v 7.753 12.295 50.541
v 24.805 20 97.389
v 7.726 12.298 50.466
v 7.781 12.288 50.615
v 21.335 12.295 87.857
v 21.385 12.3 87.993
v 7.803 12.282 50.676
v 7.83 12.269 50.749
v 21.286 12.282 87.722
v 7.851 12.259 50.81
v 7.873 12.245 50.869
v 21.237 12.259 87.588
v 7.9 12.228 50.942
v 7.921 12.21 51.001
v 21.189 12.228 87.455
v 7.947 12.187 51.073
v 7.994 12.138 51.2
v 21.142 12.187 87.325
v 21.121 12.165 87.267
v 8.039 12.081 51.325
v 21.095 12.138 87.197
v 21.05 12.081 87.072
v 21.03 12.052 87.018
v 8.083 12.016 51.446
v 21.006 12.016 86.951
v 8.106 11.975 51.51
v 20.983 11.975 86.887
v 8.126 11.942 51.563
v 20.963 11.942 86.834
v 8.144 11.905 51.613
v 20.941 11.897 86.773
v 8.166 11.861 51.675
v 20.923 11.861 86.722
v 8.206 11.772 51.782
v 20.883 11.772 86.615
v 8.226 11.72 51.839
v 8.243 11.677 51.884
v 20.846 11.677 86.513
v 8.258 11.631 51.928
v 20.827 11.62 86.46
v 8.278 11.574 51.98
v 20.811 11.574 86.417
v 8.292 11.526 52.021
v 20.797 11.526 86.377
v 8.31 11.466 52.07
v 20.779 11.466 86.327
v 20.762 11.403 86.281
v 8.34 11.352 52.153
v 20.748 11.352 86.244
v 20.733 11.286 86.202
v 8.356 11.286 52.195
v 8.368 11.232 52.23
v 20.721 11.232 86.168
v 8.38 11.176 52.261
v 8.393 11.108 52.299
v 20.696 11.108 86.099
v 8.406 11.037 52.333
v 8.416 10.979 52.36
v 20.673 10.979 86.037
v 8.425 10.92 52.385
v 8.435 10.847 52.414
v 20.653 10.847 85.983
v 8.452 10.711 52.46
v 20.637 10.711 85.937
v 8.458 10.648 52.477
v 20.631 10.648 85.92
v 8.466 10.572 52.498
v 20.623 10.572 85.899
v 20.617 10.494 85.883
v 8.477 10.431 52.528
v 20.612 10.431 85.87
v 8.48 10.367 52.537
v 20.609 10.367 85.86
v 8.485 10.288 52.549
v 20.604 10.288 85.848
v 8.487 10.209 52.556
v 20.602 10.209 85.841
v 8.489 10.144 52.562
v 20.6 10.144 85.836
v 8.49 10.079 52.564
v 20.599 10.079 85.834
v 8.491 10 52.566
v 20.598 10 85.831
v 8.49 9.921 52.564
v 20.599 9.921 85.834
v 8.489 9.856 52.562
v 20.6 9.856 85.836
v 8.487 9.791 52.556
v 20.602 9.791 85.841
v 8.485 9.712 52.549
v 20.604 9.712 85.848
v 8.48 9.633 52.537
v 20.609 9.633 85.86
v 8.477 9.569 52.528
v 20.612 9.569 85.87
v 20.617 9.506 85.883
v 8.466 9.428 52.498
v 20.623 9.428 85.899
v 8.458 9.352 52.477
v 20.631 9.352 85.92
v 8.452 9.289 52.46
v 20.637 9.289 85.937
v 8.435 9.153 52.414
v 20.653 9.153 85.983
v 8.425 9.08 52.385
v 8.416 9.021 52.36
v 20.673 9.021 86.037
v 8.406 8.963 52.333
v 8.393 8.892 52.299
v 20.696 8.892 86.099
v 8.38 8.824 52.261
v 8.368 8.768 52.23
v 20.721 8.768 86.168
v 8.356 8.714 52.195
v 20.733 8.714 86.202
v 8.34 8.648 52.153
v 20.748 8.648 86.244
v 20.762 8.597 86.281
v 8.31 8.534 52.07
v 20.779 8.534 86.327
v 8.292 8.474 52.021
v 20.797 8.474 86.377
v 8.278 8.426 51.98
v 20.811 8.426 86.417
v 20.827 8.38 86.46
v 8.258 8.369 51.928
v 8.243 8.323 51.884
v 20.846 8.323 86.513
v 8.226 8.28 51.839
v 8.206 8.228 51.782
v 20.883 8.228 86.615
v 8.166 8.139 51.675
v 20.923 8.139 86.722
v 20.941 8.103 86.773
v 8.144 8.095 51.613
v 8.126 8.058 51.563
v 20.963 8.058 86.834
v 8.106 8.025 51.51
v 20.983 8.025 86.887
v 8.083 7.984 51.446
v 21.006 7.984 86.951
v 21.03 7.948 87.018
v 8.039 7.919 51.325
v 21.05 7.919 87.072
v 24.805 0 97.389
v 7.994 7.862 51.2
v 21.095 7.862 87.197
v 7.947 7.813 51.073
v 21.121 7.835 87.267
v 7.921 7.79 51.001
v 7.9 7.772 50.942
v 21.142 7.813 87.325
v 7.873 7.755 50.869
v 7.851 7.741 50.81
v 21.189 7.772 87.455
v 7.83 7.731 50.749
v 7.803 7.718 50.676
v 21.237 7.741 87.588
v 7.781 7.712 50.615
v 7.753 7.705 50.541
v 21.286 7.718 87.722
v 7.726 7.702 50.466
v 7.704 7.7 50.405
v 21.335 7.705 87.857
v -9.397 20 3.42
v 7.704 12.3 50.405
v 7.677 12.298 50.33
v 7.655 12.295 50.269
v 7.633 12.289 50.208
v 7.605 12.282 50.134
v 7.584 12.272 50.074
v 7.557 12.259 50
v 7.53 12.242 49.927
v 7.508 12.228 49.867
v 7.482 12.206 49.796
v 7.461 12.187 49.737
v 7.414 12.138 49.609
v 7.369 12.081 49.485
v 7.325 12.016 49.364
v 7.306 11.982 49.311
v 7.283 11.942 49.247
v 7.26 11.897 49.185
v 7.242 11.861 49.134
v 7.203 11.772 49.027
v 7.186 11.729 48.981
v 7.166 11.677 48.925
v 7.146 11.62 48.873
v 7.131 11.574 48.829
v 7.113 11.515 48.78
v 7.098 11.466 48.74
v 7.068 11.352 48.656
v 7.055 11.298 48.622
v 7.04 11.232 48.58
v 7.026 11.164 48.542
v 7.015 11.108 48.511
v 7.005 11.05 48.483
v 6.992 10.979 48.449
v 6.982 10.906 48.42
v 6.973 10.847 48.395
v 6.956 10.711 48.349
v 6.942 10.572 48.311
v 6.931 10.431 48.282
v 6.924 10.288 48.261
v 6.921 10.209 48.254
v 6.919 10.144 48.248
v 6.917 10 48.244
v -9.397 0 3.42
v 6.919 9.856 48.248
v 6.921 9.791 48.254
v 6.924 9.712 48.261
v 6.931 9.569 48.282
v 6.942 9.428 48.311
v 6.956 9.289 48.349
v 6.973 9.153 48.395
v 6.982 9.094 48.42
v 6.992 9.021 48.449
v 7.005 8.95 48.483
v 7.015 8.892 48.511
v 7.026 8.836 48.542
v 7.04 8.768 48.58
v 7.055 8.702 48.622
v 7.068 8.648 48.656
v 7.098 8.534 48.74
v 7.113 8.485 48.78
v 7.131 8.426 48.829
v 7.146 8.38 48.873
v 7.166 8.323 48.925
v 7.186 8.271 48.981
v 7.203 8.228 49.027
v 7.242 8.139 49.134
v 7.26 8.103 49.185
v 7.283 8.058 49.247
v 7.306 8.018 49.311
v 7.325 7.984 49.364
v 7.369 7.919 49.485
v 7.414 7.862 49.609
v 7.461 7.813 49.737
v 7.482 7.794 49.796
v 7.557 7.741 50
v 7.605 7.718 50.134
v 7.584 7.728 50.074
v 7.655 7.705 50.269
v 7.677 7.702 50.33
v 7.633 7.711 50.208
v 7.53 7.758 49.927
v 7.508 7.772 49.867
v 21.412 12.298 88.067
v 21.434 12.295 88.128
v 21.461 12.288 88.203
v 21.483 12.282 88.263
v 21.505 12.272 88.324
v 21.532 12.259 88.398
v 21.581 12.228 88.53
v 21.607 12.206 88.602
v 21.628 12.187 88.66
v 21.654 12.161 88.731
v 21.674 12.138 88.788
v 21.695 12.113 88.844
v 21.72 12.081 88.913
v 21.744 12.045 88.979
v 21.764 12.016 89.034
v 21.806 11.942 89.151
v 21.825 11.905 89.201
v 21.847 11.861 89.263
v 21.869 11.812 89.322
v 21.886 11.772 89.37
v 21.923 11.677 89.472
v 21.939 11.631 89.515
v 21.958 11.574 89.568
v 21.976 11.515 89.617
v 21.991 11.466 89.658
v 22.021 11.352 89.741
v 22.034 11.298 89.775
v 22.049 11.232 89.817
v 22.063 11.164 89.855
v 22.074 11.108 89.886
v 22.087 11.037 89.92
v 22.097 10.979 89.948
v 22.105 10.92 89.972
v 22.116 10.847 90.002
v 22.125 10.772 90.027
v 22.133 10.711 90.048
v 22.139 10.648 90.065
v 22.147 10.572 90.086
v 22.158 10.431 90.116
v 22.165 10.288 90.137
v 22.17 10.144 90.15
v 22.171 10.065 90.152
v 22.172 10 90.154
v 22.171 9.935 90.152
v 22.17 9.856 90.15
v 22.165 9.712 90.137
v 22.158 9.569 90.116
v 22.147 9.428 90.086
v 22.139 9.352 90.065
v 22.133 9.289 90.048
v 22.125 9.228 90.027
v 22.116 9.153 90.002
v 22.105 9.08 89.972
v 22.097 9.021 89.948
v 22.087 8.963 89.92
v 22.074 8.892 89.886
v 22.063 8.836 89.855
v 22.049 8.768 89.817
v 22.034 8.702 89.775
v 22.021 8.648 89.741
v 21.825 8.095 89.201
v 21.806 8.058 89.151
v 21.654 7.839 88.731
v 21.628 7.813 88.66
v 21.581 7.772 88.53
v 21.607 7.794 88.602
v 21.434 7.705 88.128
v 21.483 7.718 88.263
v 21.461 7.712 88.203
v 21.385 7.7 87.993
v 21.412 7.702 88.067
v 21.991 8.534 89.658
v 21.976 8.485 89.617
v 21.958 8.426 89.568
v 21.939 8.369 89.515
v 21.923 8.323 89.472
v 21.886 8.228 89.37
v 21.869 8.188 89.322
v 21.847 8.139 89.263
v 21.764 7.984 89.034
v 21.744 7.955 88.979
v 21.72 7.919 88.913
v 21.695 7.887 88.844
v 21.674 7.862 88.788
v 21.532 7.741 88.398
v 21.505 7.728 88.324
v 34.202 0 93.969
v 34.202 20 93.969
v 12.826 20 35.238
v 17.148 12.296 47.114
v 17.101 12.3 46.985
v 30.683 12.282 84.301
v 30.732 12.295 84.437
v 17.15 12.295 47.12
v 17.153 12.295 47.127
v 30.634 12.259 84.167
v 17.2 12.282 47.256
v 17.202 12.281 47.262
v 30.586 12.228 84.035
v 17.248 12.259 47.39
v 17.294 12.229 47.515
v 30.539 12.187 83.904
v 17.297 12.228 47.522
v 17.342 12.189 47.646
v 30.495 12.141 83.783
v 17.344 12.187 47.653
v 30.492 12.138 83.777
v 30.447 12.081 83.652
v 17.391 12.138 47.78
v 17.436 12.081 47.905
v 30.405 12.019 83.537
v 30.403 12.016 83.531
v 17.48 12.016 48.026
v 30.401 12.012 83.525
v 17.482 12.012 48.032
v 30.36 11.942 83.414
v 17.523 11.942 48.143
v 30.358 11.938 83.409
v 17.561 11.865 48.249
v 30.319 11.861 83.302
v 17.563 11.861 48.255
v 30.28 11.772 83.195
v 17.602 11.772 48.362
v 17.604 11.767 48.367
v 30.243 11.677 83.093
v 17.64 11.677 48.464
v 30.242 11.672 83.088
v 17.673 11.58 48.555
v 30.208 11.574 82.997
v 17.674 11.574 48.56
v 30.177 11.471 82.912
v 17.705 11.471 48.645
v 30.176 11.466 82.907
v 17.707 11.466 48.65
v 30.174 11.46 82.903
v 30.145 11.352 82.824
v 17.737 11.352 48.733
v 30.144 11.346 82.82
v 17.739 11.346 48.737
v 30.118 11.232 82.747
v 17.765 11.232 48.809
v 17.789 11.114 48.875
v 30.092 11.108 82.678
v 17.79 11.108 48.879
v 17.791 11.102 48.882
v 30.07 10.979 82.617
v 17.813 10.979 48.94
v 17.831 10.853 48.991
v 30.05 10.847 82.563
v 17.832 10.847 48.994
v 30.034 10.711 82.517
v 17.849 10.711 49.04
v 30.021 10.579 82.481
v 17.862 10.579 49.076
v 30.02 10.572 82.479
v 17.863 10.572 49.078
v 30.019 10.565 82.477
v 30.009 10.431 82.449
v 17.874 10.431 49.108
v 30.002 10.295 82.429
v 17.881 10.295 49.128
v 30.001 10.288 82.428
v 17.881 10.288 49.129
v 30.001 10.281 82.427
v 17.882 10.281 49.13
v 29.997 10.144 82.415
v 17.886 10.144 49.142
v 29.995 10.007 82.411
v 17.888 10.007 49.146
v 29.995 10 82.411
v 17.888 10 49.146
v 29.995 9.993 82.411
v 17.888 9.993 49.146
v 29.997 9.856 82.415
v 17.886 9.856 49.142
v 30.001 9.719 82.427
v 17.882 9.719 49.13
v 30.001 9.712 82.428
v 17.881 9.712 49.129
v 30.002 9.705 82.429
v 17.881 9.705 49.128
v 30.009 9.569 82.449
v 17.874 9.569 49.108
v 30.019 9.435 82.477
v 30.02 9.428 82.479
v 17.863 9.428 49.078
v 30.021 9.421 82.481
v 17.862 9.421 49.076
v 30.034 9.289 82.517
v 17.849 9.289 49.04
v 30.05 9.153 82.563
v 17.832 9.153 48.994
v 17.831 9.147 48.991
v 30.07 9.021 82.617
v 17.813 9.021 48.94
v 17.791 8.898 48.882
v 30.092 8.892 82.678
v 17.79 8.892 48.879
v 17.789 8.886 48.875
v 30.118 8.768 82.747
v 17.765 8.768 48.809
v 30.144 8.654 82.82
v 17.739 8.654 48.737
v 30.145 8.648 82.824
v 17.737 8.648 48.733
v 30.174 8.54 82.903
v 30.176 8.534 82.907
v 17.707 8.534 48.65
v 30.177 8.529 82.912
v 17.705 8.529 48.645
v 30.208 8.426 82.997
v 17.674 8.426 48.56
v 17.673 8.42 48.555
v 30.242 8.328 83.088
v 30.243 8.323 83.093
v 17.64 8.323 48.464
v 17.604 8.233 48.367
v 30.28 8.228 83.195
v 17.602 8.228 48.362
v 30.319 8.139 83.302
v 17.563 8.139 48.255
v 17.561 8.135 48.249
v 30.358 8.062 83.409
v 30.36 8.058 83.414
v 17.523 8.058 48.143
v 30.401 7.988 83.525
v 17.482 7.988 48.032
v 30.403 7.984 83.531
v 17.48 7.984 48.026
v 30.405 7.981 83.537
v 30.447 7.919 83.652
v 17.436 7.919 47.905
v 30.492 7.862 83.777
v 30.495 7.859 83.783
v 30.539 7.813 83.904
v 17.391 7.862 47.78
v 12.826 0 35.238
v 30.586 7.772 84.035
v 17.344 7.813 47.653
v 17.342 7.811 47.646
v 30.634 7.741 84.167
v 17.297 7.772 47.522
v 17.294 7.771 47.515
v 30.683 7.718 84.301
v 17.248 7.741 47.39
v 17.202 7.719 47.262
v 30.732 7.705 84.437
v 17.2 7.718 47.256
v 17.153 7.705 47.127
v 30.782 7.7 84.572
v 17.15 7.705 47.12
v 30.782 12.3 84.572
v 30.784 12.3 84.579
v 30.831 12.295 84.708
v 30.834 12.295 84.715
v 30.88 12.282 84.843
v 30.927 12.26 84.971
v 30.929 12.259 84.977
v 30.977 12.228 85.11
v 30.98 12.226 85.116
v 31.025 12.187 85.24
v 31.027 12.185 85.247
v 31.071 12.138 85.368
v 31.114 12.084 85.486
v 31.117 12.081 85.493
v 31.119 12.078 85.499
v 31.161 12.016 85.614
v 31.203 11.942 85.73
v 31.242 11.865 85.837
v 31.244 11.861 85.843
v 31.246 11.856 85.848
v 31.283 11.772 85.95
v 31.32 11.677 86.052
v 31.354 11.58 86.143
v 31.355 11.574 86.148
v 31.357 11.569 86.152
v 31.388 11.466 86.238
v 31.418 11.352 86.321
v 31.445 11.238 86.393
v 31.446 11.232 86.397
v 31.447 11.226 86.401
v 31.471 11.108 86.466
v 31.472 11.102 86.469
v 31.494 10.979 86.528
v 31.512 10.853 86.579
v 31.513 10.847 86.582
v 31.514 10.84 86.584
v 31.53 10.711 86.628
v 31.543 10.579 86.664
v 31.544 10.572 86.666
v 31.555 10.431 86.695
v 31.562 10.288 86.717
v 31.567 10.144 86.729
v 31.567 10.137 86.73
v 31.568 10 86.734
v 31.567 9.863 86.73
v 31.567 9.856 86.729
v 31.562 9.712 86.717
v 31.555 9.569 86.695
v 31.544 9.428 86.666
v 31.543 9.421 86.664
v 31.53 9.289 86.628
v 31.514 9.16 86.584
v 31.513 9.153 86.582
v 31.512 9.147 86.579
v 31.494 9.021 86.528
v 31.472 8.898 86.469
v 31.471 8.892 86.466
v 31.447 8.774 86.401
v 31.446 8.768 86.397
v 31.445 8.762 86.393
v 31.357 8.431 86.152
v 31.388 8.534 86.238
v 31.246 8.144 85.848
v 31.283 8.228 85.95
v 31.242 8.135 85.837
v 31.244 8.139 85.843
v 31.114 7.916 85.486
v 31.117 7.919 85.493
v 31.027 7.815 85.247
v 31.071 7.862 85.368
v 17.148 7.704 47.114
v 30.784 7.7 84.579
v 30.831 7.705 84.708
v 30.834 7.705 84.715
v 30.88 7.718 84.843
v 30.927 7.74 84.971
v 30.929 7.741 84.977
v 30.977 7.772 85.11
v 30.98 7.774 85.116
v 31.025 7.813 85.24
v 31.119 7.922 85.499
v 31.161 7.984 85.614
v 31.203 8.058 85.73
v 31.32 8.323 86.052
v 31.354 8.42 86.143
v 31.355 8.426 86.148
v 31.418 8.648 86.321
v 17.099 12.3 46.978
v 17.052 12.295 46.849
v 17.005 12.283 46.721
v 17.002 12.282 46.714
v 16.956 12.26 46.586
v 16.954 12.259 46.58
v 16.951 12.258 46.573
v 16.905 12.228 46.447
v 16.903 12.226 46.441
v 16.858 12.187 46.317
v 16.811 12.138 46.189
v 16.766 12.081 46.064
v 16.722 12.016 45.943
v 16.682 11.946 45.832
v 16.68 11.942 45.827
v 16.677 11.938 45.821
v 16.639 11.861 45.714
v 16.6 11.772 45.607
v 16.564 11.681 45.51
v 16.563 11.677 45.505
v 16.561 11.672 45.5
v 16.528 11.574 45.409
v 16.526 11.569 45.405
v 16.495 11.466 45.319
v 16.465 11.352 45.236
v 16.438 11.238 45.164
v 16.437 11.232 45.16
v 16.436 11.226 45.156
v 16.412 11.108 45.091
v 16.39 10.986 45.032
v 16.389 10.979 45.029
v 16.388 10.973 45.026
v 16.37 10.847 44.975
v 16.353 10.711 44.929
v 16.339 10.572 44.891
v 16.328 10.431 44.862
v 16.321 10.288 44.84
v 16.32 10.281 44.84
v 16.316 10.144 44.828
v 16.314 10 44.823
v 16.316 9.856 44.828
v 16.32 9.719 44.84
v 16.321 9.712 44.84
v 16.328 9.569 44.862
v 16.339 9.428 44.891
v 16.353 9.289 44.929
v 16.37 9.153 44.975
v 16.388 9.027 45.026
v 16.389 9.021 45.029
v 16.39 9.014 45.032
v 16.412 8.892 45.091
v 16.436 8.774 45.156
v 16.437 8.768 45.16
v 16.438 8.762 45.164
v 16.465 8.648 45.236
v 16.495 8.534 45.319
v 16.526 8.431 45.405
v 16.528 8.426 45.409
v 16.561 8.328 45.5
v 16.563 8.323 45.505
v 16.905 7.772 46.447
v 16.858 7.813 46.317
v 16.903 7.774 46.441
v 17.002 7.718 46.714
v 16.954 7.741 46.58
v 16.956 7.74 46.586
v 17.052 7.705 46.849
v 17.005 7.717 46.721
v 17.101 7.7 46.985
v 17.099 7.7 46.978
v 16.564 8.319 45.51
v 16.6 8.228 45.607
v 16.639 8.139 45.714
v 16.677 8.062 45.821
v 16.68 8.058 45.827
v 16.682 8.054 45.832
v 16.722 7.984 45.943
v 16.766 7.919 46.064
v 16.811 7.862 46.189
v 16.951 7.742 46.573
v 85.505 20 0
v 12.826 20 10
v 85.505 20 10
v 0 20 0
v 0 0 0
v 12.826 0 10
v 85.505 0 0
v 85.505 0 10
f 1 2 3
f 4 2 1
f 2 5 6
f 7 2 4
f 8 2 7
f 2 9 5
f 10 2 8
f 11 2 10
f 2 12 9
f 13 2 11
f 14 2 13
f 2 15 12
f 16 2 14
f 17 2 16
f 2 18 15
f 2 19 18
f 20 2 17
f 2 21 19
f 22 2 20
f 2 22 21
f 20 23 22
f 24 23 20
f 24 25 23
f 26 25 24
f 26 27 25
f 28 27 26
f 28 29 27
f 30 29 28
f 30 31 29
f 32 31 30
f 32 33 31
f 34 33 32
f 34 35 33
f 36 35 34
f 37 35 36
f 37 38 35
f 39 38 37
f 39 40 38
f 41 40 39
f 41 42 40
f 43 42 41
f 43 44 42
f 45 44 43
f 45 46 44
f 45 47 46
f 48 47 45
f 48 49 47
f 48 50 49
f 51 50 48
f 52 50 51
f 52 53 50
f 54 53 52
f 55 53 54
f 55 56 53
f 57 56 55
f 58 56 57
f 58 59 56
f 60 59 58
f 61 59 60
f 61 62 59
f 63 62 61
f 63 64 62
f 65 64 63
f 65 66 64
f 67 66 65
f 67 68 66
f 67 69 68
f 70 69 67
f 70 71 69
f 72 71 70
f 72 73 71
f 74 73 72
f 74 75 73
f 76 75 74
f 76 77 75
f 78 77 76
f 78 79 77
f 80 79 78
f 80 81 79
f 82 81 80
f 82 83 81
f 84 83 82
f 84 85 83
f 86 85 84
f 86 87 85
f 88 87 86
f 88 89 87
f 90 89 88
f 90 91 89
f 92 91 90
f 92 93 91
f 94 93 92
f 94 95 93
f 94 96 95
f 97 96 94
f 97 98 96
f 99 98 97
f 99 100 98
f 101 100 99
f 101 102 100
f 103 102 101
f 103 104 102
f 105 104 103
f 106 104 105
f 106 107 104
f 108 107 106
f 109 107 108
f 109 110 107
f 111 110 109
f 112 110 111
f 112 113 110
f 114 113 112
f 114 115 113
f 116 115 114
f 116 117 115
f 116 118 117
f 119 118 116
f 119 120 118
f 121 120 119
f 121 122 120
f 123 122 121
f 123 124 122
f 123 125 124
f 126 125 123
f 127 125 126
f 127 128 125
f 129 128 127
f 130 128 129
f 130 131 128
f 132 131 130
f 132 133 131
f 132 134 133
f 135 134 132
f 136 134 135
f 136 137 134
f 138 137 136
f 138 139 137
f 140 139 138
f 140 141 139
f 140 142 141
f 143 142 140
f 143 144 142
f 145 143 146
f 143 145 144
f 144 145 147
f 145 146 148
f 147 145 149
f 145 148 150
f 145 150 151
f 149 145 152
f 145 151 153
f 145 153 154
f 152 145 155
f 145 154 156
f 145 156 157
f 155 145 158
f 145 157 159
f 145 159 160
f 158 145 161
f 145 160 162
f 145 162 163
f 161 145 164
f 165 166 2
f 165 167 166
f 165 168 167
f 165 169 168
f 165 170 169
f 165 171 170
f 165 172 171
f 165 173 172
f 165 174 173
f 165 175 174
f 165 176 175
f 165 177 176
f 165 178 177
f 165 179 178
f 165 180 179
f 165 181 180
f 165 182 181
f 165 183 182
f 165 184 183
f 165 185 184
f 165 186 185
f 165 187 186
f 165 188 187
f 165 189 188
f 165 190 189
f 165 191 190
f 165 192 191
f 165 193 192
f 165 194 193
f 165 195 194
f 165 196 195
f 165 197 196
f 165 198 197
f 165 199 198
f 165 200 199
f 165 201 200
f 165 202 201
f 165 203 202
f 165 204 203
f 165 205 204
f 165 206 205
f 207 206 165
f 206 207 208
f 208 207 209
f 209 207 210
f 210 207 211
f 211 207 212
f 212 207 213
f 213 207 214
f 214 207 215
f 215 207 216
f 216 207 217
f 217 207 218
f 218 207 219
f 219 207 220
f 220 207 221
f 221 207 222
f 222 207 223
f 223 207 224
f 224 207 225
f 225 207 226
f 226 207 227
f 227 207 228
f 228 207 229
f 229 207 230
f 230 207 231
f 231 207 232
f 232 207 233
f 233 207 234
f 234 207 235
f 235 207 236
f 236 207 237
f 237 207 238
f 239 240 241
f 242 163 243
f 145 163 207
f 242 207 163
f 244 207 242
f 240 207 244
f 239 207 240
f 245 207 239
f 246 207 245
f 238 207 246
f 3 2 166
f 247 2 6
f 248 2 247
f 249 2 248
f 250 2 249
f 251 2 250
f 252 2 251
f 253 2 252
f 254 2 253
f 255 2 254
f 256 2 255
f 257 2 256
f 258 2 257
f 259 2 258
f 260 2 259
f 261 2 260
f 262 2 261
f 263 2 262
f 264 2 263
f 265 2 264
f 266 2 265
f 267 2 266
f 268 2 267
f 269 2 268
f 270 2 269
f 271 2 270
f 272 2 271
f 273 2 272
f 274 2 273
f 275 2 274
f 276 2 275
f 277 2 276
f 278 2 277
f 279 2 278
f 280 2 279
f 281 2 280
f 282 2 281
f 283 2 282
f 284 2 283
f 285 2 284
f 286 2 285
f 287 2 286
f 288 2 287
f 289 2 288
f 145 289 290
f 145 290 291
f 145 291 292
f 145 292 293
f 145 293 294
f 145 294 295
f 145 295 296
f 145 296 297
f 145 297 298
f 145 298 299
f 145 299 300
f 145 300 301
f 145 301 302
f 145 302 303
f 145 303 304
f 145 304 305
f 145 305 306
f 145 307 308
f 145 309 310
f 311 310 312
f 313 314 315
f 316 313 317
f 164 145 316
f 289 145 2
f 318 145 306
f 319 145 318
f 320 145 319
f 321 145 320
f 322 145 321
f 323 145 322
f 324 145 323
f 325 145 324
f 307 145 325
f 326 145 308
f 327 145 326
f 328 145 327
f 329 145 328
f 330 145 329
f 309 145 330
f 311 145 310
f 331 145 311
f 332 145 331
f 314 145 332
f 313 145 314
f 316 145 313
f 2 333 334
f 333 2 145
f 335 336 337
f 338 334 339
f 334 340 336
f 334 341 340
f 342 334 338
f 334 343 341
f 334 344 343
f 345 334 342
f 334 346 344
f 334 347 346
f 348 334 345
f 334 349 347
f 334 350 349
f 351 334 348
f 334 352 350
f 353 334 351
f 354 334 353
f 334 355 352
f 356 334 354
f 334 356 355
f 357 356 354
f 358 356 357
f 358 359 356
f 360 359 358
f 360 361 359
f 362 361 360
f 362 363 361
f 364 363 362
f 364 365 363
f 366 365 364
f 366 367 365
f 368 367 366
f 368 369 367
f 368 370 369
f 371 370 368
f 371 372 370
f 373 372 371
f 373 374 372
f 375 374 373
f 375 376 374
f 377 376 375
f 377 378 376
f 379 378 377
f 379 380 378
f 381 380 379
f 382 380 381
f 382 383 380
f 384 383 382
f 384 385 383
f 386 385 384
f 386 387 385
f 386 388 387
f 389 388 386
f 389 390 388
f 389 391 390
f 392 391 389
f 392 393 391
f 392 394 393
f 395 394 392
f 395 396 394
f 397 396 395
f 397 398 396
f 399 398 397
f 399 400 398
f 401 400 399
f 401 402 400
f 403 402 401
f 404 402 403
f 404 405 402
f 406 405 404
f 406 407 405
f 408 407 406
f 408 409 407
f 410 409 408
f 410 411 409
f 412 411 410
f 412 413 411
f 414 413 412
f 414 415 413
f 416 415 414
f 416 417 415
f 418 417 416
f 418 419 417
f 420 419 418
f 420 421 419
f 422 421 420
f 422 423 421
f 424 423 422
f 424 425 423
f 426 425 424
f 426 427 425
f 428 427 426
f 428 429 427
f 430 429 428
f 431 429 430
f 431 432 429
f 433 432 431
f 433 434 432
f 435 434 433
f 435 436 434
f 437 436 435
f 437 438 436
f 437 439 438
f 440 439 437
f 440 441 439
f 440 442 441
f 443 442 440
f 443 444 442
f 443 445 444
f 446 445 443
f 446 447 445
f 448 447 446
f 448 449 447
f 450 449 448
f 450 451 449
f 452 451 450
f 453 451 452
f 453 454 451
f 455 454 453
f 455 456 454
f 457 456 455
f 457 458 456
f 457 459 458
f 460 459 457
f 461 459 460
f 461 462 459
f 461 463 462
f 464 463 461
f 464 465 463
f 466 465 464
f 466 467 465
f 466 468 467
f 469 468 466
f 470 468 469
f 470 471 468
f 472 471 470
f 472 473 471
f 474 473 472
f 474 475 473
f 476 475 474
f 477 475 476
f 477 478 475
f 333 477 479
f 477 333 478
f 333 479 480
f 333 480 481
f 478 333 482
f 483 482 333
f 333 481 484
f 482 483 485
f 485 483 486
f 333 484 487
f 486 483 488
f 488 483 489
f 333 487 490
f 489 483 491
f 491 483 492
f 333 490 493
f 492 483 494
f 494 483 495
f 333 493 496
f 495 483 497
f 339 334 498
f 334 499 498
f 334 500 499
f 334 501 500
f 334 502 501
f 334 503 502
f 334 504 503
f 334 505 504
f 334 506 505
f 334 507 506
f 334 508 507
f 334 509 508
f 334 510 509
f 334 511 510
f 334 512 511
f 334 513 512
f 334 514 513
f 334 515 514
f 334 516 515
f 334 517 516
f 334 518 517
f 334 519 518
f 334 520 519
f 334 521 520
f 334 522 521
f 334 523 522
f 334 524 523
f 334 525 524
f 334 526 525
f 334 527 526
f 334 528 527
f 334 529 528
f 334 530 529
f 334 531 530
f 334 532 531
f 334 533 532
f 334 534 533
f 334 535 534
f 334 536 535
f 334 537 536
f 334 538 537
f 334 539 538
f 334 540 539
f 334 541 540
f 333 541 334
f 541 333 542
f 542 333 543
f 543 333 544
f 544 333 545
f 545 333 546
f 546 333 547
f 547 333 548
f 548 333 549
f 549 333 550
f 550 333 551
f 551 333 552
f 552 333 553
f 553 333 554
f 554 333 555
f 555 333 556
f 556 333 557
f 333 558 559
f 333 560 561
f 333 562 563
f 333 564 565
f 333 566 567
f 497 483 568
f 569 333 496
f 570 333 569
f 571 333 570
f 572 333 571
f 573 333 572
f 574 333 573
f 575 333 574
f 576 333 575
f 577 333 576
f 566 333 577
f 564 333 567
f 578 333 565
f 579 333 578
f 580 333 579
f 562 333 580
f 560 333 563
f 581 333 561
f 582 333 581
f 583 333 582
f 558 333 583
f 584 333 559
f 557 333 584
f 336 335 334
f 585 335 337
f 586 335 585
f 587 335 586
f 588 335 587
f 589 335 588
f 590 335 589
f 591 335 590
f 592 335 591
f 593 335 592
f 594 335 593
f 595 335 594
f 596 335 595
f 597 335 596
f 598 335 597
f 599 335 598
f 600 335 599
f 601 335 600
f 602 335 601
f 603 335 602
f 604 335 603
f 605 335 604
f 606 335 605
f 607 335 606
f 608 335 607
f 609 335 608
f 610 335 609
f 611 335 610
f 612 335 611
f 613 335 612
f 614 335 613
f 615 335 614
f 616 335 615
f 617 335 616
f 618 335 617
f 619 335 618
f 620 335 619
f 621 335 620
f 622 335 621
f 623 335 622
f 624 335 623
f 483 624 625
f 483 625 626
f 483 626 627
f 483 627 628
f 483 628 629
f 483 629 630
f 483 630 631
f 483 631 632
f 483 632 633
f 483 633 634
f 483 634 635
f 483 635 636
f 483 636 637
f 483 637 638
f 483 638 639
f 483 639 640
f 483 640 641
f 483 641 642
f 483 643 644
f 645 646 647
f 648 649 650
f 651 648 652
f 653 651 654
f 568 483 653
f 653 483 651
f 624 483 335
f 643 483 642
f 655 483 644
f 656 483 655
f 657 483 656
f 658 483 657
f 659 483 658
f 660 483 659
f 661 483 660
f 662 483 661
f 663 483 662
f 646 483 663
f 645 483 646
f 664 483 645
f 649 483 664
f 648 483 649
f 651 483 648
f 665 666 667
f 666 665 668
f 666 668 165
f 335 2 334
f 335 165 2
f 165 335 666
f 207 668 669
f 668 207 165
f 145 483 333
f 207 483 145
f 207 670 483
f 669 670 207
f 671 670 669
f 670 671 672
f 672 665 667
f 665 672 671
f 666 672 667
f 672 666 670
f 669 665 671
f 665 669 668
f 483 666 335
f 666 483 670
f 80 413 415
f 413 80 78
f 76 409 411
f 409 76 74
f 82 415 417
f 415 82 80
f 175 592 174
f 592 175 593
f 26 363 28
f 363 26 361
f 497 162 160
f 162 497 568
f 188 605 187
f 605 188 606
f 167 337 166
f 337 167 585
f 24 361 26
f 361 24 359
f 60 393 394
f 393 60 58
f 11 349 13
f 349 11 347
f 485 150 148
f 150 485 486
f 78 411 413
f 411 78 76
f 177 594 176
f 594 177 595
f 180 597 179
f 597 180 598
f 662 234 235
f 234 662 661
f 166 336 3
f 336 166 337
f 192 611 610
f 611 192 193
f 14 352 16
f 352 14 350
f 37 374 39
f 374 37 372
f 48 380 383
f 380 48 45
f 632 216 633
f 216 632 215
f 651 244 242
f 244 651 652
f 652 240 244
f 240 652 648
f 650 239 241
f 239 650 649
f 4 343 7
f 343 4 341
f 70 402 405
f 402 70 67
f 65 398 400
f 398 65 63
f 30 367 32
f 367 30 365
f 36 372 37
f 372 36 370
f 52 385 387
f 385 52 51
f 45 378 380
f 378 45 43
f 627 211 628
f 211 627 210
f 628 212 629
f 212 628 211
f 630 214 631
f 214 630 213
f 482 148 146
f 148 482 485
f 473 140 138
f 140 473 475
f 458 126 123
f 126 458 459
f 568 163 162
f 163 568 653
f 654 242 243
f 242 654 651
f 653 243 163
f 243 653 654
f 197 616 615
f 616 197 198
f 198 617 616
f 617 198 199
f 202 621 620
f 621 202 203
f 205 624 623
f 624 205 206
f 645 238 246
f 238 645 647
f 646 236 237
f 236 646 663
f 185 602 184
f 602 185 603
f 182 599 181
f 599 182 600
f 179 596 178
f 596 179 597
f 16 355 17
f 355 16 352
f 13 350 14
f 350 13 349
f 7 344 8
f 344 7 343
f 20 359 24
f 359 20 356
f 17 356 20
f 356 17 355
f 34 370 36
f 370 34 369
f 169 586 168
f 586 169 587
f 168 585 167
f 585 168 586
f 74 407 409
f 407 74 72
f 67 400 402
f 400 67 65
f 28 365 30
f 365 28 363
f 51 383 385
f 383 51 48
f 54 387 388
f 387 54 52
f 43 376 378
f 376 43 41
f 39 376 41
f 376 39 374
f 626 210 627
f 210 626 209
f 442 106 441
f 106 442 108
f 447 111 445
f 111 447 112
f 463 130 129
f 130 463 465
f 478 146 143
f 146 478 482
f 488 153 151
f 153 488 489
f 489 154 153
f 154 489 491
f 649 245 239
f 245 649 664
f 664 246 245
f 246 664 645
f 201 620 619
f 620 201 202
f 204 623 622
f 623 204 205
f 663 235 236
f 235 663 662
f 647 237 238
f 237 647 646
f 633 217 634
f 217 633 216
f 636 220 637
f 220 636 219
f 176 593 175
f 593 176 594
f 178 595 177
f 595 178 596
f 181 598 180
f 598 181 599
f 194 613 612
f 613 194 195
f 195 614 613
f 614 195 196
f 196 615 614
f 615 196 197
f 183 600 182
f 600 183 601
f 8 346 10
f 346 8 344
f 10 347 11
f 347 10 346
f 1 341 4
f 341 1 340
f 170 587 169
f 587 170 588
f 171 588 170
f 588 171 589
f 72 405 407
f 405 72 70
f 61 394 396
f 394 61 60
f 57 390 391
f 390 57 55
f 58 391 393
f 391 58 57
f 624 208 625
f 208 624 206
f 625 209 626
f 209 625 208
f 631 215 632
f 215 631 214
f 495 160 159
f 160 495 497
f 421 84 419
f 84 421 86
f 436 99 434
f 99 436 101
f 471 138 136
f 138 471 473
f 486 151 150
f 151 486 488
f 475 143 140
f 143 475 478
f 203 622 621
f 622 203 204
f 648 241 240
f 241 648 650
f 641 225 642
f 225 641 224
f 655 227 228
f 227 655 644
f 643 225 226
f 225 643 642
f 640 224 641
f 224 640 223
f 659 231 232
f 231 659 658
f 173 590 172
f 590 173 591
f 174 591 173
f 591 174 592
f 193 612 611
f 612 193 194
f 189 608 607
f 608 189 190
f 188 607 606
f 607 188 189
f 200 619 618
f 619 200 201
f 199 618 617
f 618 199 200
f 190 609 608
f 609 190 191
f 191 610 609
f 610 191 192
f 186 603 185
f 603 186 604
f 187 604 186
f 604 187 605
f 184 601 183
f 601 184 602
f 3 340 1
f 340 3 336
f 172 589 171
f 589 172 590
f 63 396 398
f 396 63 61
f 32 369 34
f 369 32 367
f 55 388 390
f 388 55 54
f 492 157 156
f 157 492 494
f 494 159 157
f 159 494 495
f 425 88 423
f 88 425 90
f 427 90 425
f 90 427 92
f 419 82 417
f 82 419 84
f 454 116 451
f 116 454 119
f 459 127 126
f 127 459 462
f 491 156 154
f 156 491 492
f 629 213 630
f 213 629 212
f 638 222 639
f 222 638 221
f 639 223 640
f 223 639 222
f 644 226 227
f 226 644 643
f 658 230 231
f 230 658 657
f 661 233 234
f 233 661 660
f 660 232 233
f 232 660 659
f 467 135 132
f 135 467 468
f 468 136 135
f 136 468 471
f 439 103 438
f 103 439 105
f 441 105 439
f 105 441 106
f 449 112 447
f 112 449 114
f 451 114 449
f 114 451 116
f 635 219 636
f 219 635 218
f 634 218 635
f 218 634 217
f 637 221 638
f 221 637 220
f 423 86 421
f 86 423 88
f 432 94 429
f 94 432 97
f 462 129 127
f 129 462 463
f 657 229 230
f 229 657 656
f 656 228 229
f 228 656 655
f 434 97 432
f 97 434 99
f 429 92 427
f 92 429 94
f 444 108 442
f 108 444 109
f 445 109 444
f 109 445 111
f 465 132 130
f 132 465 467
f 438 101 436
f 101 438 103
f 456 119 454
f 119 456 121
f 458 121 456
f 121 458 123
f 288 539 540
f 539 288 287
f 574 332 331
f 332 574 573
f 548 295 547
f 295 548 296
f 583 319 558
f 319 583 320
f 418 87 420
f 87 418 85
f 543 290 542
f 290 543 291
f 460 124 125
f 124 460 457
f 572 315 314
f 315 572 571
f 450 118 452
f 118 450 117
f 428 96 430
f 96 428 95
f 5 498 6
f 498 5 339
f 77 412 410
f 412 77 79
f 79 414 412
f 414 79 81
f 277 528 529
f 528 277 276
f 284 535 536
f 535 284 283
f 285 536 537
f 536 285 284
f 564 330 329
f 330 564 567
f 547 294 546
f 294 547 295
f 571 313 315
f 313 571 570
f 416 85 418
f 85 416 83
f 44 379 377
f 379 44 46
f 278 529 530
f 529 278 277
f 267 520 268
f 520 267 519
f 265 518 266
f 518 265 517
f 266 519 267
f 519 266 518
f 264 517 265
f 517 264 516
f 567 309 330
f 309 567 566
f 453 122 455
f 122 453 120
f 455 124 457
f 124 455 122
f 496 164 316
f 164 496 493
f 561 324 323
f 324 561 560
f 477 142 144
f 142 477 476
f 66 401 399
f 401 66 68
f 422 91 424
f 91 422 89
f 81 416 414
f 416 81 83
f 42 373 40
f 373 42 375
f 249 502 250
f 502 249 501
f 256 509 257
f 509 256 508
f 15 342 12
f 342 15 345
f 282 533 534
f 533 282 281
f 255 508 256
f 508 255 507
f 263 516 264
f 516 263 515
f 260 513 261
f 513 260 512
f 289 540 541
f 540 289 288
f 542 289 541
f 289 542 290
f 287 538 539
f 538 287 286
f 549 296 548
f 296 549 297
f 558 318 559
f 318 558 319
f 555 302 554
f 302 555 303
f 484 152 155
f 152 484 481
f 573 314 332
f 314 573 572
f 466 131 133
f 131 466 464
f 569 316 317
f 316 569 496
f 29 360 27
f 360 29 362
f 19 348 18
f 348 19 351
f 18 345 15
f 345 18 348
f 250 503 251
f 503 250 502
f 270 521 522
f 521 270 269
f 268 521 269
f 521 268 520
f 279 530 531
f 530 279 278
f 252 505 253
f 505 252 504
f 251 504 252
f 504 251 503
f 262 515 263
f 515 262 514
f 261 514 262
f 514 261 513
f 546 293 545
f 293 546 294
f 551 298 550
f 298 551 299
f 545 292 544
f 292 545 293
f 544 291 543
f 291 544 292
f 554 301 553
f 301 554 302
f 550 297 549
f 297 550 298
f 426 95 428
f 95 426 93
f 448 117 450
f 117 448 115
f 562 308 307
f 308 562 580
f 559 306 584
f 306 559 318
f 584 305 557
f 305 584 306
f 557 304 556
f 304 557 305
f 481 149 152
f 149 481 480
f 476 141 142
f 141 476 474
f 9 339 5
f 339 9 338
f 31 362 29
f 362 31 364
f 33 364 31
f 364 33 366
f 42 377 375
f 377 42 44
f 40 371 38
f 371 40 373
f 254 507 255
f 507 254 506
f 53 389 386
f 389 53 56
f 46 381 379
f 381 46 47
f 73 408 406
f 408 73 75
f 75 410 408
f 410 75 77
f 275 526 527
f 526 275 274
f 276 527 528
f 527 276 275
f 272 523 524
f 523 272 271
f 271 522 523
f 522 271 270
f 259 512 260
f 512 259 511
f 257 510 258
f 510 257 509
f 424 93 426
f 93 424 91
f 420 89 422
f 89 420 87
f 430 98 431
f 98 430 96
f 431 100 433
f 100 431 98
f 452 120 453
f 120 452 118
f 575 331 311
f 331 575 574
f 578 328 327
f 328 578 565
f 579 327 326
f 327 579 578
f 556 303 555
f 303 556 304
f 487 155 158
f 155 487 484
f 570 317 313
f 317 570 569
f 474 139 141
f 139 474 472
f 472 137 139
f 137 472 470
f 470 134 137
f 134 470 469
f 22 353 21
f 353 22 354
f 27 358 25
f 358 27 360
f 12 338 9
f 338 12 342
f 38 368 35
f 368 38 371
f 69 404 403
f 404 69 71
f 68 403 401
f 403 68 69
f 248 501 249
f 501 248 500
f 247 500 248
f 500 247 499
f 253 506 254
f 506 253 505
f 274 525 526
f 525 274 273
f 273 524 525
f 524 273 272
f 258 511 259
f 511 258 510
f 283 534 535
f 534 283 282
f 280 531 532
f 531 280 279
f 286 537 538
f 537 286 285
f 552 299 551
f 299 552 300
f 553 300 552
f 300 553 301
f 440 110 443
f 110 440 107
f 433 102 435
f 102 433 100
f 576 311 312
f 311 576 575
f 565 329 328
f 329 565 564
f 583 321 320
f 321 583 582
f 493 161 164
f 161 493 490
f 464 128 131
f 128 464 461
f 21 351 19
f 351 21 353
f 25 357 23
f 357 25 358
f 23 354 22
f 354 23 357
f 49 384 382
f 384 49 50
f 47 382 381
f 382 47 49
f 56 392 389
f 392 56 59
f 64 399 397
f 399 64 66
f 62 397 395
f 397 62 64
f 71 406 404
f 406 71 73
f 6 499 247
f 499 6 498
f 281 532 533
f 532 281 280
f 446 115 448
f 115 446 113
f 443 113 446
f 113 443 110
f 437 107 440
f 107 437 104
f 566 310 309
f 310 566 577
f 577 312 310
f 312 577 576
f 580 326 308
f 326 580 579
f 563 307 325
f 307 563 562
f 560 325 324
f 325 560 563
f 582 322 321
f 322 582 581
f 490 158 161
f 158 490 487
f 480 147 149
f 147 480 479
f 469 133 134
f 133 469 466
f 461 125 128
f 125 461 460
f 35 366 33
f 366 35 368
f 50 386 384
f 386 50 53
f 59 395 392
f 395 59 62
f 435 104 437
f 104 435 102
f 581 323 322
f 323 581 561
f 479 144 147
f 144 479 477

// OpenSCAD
////////////////////////////////////////////////////////////
// Dimensões do "tampo" a ser fabricado em madeira ou alumínio
// Somenta a altura influenciará nas dimensões do pé.
a_tampo = 250;
l_tampo = 500;

// Dimensões do pé propriamente dito.
a_conexao = 100;
i_conexao = 70;

e_pe = 10;
l_pe = 20;

c_base = a_tampo * cos( i_conexao );

h_juncao = a_conexao * sin( i_conexao );
c_juncao = a_tampo * cos( i_conexao ) * 0.15;

// Dimensões e posição do furo:
d_furo = 4.6;
s_furos = a_conexao * 0.4;
h_furo = a_conexao * 0.5;
////////////////////////////////////////////////////////////


// Modelo:
difference(){
    union(){
        // Conexão:
        rotate( -i_conexao, [ 0, 1, 0 ] )
            cube( [ a_conexao, l_pe, e_pe ] );
        // Base:
        cube( [ c_base, l_pe, e_pe ] );
        // Junção:
        cube( [ c_juncao, l_pe, h_juncao ] );
    }
    // Remove excesso da junção:
    rotate( -i_conexao, [ 0, 1, 0 ] )
        translate( [ 0, -1, e_pe ] )
            cube( [ 100, 100, 100 ] );
    // Furo inferior:
    rotate( -i_conexao, [ 0, 1, 0 ] )
        translate( [ h_furo, 0.5 * l_pe, -1 ] )
            cylinder( d = d_furo, h = 2 * e_pe, $fn = 100 );
    // Furo superior:
    rotate( -i_conexao, [ 0, 1, 0 ] )
        translate( [ h_furo + s_furos, 0.5 * l_pe, -1 ] )
            cylinder( d = d_furo, h = 2 * e_pe, $fn = 100 );
}
